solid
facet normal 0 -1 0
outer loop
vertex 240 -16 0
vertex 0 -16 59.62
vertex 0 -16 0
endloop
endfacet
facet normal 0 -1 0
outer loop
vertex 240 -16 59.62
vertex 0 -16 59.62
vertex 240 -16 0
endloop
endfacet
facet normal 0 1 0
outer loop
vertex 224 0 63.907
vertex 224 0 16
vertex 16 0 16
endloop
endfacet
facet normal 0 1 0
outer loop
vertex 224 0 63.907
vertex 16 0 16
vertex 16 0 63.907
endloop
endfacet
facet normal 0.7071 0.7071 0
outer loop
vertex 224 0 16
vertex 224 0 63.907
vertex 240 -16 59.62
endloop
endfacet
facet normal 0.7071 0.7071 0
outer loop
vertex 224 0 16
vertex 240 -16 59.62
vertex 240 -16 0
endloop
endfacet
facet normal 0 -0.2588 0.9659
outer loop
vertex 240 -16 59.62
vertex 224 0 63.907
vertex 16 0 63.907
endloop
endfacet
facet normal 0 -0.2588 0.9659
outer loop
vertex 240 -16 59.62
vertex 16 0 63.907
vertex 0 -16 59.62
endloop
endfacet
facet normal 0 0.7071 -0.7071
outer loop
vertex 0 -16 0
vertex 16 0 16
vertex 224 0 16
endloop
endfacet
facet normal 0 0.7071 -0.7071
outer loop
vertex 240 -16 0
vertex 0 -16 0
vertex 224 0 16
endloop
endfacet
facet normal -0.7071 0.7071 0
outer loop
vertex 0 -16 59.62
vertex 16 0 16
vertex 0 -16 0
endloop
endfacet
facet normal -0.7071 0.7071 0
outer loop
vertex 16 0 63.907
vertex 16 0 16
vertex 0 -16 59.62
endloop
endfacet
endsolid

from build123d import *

# Parameters (mm, degrees)
F0_W     = 240
F0_H     = 59.62
F1_DEPTH = 16
F3_DEPTH = 240
F4_SIZE  = 15.99999


# Not quite as in the source:
# - a fillet or chamfer is up to 0.001 mm smaller than in the source, because OpenCascade refuses the exact size


with BuildPart() as f1:
    # F0 (on Front) → F1 (new body)
    with BuildSketch(Plane.XZ):
        with Locations((120, 29.81)):
            Rectangle(F0_W, F0_H)
    extrude(amount=F1_DEPTH)

    # F2 (on Right) → F3 (join)
    with BuildSketch(Plane.YZ):
        Polygon((0, 63.9071870789), (-16, 59.62), (0, 59.62), align=None)
    extrude(amount=F3_DEPTH)

    # F4 (size 16 in the source; OpenCascade refuses exactly that, so slightly less here)
    f4_edges = [f1.edges().sort_by_distance(p)[0] for p in [
        (0, 0, 31.953594),
        (120, 0, 0),
        (240, 0, 31.953594),
    ]]
    chamfer(f4_edges, length=F4_SIZE)


solid = f1.part
